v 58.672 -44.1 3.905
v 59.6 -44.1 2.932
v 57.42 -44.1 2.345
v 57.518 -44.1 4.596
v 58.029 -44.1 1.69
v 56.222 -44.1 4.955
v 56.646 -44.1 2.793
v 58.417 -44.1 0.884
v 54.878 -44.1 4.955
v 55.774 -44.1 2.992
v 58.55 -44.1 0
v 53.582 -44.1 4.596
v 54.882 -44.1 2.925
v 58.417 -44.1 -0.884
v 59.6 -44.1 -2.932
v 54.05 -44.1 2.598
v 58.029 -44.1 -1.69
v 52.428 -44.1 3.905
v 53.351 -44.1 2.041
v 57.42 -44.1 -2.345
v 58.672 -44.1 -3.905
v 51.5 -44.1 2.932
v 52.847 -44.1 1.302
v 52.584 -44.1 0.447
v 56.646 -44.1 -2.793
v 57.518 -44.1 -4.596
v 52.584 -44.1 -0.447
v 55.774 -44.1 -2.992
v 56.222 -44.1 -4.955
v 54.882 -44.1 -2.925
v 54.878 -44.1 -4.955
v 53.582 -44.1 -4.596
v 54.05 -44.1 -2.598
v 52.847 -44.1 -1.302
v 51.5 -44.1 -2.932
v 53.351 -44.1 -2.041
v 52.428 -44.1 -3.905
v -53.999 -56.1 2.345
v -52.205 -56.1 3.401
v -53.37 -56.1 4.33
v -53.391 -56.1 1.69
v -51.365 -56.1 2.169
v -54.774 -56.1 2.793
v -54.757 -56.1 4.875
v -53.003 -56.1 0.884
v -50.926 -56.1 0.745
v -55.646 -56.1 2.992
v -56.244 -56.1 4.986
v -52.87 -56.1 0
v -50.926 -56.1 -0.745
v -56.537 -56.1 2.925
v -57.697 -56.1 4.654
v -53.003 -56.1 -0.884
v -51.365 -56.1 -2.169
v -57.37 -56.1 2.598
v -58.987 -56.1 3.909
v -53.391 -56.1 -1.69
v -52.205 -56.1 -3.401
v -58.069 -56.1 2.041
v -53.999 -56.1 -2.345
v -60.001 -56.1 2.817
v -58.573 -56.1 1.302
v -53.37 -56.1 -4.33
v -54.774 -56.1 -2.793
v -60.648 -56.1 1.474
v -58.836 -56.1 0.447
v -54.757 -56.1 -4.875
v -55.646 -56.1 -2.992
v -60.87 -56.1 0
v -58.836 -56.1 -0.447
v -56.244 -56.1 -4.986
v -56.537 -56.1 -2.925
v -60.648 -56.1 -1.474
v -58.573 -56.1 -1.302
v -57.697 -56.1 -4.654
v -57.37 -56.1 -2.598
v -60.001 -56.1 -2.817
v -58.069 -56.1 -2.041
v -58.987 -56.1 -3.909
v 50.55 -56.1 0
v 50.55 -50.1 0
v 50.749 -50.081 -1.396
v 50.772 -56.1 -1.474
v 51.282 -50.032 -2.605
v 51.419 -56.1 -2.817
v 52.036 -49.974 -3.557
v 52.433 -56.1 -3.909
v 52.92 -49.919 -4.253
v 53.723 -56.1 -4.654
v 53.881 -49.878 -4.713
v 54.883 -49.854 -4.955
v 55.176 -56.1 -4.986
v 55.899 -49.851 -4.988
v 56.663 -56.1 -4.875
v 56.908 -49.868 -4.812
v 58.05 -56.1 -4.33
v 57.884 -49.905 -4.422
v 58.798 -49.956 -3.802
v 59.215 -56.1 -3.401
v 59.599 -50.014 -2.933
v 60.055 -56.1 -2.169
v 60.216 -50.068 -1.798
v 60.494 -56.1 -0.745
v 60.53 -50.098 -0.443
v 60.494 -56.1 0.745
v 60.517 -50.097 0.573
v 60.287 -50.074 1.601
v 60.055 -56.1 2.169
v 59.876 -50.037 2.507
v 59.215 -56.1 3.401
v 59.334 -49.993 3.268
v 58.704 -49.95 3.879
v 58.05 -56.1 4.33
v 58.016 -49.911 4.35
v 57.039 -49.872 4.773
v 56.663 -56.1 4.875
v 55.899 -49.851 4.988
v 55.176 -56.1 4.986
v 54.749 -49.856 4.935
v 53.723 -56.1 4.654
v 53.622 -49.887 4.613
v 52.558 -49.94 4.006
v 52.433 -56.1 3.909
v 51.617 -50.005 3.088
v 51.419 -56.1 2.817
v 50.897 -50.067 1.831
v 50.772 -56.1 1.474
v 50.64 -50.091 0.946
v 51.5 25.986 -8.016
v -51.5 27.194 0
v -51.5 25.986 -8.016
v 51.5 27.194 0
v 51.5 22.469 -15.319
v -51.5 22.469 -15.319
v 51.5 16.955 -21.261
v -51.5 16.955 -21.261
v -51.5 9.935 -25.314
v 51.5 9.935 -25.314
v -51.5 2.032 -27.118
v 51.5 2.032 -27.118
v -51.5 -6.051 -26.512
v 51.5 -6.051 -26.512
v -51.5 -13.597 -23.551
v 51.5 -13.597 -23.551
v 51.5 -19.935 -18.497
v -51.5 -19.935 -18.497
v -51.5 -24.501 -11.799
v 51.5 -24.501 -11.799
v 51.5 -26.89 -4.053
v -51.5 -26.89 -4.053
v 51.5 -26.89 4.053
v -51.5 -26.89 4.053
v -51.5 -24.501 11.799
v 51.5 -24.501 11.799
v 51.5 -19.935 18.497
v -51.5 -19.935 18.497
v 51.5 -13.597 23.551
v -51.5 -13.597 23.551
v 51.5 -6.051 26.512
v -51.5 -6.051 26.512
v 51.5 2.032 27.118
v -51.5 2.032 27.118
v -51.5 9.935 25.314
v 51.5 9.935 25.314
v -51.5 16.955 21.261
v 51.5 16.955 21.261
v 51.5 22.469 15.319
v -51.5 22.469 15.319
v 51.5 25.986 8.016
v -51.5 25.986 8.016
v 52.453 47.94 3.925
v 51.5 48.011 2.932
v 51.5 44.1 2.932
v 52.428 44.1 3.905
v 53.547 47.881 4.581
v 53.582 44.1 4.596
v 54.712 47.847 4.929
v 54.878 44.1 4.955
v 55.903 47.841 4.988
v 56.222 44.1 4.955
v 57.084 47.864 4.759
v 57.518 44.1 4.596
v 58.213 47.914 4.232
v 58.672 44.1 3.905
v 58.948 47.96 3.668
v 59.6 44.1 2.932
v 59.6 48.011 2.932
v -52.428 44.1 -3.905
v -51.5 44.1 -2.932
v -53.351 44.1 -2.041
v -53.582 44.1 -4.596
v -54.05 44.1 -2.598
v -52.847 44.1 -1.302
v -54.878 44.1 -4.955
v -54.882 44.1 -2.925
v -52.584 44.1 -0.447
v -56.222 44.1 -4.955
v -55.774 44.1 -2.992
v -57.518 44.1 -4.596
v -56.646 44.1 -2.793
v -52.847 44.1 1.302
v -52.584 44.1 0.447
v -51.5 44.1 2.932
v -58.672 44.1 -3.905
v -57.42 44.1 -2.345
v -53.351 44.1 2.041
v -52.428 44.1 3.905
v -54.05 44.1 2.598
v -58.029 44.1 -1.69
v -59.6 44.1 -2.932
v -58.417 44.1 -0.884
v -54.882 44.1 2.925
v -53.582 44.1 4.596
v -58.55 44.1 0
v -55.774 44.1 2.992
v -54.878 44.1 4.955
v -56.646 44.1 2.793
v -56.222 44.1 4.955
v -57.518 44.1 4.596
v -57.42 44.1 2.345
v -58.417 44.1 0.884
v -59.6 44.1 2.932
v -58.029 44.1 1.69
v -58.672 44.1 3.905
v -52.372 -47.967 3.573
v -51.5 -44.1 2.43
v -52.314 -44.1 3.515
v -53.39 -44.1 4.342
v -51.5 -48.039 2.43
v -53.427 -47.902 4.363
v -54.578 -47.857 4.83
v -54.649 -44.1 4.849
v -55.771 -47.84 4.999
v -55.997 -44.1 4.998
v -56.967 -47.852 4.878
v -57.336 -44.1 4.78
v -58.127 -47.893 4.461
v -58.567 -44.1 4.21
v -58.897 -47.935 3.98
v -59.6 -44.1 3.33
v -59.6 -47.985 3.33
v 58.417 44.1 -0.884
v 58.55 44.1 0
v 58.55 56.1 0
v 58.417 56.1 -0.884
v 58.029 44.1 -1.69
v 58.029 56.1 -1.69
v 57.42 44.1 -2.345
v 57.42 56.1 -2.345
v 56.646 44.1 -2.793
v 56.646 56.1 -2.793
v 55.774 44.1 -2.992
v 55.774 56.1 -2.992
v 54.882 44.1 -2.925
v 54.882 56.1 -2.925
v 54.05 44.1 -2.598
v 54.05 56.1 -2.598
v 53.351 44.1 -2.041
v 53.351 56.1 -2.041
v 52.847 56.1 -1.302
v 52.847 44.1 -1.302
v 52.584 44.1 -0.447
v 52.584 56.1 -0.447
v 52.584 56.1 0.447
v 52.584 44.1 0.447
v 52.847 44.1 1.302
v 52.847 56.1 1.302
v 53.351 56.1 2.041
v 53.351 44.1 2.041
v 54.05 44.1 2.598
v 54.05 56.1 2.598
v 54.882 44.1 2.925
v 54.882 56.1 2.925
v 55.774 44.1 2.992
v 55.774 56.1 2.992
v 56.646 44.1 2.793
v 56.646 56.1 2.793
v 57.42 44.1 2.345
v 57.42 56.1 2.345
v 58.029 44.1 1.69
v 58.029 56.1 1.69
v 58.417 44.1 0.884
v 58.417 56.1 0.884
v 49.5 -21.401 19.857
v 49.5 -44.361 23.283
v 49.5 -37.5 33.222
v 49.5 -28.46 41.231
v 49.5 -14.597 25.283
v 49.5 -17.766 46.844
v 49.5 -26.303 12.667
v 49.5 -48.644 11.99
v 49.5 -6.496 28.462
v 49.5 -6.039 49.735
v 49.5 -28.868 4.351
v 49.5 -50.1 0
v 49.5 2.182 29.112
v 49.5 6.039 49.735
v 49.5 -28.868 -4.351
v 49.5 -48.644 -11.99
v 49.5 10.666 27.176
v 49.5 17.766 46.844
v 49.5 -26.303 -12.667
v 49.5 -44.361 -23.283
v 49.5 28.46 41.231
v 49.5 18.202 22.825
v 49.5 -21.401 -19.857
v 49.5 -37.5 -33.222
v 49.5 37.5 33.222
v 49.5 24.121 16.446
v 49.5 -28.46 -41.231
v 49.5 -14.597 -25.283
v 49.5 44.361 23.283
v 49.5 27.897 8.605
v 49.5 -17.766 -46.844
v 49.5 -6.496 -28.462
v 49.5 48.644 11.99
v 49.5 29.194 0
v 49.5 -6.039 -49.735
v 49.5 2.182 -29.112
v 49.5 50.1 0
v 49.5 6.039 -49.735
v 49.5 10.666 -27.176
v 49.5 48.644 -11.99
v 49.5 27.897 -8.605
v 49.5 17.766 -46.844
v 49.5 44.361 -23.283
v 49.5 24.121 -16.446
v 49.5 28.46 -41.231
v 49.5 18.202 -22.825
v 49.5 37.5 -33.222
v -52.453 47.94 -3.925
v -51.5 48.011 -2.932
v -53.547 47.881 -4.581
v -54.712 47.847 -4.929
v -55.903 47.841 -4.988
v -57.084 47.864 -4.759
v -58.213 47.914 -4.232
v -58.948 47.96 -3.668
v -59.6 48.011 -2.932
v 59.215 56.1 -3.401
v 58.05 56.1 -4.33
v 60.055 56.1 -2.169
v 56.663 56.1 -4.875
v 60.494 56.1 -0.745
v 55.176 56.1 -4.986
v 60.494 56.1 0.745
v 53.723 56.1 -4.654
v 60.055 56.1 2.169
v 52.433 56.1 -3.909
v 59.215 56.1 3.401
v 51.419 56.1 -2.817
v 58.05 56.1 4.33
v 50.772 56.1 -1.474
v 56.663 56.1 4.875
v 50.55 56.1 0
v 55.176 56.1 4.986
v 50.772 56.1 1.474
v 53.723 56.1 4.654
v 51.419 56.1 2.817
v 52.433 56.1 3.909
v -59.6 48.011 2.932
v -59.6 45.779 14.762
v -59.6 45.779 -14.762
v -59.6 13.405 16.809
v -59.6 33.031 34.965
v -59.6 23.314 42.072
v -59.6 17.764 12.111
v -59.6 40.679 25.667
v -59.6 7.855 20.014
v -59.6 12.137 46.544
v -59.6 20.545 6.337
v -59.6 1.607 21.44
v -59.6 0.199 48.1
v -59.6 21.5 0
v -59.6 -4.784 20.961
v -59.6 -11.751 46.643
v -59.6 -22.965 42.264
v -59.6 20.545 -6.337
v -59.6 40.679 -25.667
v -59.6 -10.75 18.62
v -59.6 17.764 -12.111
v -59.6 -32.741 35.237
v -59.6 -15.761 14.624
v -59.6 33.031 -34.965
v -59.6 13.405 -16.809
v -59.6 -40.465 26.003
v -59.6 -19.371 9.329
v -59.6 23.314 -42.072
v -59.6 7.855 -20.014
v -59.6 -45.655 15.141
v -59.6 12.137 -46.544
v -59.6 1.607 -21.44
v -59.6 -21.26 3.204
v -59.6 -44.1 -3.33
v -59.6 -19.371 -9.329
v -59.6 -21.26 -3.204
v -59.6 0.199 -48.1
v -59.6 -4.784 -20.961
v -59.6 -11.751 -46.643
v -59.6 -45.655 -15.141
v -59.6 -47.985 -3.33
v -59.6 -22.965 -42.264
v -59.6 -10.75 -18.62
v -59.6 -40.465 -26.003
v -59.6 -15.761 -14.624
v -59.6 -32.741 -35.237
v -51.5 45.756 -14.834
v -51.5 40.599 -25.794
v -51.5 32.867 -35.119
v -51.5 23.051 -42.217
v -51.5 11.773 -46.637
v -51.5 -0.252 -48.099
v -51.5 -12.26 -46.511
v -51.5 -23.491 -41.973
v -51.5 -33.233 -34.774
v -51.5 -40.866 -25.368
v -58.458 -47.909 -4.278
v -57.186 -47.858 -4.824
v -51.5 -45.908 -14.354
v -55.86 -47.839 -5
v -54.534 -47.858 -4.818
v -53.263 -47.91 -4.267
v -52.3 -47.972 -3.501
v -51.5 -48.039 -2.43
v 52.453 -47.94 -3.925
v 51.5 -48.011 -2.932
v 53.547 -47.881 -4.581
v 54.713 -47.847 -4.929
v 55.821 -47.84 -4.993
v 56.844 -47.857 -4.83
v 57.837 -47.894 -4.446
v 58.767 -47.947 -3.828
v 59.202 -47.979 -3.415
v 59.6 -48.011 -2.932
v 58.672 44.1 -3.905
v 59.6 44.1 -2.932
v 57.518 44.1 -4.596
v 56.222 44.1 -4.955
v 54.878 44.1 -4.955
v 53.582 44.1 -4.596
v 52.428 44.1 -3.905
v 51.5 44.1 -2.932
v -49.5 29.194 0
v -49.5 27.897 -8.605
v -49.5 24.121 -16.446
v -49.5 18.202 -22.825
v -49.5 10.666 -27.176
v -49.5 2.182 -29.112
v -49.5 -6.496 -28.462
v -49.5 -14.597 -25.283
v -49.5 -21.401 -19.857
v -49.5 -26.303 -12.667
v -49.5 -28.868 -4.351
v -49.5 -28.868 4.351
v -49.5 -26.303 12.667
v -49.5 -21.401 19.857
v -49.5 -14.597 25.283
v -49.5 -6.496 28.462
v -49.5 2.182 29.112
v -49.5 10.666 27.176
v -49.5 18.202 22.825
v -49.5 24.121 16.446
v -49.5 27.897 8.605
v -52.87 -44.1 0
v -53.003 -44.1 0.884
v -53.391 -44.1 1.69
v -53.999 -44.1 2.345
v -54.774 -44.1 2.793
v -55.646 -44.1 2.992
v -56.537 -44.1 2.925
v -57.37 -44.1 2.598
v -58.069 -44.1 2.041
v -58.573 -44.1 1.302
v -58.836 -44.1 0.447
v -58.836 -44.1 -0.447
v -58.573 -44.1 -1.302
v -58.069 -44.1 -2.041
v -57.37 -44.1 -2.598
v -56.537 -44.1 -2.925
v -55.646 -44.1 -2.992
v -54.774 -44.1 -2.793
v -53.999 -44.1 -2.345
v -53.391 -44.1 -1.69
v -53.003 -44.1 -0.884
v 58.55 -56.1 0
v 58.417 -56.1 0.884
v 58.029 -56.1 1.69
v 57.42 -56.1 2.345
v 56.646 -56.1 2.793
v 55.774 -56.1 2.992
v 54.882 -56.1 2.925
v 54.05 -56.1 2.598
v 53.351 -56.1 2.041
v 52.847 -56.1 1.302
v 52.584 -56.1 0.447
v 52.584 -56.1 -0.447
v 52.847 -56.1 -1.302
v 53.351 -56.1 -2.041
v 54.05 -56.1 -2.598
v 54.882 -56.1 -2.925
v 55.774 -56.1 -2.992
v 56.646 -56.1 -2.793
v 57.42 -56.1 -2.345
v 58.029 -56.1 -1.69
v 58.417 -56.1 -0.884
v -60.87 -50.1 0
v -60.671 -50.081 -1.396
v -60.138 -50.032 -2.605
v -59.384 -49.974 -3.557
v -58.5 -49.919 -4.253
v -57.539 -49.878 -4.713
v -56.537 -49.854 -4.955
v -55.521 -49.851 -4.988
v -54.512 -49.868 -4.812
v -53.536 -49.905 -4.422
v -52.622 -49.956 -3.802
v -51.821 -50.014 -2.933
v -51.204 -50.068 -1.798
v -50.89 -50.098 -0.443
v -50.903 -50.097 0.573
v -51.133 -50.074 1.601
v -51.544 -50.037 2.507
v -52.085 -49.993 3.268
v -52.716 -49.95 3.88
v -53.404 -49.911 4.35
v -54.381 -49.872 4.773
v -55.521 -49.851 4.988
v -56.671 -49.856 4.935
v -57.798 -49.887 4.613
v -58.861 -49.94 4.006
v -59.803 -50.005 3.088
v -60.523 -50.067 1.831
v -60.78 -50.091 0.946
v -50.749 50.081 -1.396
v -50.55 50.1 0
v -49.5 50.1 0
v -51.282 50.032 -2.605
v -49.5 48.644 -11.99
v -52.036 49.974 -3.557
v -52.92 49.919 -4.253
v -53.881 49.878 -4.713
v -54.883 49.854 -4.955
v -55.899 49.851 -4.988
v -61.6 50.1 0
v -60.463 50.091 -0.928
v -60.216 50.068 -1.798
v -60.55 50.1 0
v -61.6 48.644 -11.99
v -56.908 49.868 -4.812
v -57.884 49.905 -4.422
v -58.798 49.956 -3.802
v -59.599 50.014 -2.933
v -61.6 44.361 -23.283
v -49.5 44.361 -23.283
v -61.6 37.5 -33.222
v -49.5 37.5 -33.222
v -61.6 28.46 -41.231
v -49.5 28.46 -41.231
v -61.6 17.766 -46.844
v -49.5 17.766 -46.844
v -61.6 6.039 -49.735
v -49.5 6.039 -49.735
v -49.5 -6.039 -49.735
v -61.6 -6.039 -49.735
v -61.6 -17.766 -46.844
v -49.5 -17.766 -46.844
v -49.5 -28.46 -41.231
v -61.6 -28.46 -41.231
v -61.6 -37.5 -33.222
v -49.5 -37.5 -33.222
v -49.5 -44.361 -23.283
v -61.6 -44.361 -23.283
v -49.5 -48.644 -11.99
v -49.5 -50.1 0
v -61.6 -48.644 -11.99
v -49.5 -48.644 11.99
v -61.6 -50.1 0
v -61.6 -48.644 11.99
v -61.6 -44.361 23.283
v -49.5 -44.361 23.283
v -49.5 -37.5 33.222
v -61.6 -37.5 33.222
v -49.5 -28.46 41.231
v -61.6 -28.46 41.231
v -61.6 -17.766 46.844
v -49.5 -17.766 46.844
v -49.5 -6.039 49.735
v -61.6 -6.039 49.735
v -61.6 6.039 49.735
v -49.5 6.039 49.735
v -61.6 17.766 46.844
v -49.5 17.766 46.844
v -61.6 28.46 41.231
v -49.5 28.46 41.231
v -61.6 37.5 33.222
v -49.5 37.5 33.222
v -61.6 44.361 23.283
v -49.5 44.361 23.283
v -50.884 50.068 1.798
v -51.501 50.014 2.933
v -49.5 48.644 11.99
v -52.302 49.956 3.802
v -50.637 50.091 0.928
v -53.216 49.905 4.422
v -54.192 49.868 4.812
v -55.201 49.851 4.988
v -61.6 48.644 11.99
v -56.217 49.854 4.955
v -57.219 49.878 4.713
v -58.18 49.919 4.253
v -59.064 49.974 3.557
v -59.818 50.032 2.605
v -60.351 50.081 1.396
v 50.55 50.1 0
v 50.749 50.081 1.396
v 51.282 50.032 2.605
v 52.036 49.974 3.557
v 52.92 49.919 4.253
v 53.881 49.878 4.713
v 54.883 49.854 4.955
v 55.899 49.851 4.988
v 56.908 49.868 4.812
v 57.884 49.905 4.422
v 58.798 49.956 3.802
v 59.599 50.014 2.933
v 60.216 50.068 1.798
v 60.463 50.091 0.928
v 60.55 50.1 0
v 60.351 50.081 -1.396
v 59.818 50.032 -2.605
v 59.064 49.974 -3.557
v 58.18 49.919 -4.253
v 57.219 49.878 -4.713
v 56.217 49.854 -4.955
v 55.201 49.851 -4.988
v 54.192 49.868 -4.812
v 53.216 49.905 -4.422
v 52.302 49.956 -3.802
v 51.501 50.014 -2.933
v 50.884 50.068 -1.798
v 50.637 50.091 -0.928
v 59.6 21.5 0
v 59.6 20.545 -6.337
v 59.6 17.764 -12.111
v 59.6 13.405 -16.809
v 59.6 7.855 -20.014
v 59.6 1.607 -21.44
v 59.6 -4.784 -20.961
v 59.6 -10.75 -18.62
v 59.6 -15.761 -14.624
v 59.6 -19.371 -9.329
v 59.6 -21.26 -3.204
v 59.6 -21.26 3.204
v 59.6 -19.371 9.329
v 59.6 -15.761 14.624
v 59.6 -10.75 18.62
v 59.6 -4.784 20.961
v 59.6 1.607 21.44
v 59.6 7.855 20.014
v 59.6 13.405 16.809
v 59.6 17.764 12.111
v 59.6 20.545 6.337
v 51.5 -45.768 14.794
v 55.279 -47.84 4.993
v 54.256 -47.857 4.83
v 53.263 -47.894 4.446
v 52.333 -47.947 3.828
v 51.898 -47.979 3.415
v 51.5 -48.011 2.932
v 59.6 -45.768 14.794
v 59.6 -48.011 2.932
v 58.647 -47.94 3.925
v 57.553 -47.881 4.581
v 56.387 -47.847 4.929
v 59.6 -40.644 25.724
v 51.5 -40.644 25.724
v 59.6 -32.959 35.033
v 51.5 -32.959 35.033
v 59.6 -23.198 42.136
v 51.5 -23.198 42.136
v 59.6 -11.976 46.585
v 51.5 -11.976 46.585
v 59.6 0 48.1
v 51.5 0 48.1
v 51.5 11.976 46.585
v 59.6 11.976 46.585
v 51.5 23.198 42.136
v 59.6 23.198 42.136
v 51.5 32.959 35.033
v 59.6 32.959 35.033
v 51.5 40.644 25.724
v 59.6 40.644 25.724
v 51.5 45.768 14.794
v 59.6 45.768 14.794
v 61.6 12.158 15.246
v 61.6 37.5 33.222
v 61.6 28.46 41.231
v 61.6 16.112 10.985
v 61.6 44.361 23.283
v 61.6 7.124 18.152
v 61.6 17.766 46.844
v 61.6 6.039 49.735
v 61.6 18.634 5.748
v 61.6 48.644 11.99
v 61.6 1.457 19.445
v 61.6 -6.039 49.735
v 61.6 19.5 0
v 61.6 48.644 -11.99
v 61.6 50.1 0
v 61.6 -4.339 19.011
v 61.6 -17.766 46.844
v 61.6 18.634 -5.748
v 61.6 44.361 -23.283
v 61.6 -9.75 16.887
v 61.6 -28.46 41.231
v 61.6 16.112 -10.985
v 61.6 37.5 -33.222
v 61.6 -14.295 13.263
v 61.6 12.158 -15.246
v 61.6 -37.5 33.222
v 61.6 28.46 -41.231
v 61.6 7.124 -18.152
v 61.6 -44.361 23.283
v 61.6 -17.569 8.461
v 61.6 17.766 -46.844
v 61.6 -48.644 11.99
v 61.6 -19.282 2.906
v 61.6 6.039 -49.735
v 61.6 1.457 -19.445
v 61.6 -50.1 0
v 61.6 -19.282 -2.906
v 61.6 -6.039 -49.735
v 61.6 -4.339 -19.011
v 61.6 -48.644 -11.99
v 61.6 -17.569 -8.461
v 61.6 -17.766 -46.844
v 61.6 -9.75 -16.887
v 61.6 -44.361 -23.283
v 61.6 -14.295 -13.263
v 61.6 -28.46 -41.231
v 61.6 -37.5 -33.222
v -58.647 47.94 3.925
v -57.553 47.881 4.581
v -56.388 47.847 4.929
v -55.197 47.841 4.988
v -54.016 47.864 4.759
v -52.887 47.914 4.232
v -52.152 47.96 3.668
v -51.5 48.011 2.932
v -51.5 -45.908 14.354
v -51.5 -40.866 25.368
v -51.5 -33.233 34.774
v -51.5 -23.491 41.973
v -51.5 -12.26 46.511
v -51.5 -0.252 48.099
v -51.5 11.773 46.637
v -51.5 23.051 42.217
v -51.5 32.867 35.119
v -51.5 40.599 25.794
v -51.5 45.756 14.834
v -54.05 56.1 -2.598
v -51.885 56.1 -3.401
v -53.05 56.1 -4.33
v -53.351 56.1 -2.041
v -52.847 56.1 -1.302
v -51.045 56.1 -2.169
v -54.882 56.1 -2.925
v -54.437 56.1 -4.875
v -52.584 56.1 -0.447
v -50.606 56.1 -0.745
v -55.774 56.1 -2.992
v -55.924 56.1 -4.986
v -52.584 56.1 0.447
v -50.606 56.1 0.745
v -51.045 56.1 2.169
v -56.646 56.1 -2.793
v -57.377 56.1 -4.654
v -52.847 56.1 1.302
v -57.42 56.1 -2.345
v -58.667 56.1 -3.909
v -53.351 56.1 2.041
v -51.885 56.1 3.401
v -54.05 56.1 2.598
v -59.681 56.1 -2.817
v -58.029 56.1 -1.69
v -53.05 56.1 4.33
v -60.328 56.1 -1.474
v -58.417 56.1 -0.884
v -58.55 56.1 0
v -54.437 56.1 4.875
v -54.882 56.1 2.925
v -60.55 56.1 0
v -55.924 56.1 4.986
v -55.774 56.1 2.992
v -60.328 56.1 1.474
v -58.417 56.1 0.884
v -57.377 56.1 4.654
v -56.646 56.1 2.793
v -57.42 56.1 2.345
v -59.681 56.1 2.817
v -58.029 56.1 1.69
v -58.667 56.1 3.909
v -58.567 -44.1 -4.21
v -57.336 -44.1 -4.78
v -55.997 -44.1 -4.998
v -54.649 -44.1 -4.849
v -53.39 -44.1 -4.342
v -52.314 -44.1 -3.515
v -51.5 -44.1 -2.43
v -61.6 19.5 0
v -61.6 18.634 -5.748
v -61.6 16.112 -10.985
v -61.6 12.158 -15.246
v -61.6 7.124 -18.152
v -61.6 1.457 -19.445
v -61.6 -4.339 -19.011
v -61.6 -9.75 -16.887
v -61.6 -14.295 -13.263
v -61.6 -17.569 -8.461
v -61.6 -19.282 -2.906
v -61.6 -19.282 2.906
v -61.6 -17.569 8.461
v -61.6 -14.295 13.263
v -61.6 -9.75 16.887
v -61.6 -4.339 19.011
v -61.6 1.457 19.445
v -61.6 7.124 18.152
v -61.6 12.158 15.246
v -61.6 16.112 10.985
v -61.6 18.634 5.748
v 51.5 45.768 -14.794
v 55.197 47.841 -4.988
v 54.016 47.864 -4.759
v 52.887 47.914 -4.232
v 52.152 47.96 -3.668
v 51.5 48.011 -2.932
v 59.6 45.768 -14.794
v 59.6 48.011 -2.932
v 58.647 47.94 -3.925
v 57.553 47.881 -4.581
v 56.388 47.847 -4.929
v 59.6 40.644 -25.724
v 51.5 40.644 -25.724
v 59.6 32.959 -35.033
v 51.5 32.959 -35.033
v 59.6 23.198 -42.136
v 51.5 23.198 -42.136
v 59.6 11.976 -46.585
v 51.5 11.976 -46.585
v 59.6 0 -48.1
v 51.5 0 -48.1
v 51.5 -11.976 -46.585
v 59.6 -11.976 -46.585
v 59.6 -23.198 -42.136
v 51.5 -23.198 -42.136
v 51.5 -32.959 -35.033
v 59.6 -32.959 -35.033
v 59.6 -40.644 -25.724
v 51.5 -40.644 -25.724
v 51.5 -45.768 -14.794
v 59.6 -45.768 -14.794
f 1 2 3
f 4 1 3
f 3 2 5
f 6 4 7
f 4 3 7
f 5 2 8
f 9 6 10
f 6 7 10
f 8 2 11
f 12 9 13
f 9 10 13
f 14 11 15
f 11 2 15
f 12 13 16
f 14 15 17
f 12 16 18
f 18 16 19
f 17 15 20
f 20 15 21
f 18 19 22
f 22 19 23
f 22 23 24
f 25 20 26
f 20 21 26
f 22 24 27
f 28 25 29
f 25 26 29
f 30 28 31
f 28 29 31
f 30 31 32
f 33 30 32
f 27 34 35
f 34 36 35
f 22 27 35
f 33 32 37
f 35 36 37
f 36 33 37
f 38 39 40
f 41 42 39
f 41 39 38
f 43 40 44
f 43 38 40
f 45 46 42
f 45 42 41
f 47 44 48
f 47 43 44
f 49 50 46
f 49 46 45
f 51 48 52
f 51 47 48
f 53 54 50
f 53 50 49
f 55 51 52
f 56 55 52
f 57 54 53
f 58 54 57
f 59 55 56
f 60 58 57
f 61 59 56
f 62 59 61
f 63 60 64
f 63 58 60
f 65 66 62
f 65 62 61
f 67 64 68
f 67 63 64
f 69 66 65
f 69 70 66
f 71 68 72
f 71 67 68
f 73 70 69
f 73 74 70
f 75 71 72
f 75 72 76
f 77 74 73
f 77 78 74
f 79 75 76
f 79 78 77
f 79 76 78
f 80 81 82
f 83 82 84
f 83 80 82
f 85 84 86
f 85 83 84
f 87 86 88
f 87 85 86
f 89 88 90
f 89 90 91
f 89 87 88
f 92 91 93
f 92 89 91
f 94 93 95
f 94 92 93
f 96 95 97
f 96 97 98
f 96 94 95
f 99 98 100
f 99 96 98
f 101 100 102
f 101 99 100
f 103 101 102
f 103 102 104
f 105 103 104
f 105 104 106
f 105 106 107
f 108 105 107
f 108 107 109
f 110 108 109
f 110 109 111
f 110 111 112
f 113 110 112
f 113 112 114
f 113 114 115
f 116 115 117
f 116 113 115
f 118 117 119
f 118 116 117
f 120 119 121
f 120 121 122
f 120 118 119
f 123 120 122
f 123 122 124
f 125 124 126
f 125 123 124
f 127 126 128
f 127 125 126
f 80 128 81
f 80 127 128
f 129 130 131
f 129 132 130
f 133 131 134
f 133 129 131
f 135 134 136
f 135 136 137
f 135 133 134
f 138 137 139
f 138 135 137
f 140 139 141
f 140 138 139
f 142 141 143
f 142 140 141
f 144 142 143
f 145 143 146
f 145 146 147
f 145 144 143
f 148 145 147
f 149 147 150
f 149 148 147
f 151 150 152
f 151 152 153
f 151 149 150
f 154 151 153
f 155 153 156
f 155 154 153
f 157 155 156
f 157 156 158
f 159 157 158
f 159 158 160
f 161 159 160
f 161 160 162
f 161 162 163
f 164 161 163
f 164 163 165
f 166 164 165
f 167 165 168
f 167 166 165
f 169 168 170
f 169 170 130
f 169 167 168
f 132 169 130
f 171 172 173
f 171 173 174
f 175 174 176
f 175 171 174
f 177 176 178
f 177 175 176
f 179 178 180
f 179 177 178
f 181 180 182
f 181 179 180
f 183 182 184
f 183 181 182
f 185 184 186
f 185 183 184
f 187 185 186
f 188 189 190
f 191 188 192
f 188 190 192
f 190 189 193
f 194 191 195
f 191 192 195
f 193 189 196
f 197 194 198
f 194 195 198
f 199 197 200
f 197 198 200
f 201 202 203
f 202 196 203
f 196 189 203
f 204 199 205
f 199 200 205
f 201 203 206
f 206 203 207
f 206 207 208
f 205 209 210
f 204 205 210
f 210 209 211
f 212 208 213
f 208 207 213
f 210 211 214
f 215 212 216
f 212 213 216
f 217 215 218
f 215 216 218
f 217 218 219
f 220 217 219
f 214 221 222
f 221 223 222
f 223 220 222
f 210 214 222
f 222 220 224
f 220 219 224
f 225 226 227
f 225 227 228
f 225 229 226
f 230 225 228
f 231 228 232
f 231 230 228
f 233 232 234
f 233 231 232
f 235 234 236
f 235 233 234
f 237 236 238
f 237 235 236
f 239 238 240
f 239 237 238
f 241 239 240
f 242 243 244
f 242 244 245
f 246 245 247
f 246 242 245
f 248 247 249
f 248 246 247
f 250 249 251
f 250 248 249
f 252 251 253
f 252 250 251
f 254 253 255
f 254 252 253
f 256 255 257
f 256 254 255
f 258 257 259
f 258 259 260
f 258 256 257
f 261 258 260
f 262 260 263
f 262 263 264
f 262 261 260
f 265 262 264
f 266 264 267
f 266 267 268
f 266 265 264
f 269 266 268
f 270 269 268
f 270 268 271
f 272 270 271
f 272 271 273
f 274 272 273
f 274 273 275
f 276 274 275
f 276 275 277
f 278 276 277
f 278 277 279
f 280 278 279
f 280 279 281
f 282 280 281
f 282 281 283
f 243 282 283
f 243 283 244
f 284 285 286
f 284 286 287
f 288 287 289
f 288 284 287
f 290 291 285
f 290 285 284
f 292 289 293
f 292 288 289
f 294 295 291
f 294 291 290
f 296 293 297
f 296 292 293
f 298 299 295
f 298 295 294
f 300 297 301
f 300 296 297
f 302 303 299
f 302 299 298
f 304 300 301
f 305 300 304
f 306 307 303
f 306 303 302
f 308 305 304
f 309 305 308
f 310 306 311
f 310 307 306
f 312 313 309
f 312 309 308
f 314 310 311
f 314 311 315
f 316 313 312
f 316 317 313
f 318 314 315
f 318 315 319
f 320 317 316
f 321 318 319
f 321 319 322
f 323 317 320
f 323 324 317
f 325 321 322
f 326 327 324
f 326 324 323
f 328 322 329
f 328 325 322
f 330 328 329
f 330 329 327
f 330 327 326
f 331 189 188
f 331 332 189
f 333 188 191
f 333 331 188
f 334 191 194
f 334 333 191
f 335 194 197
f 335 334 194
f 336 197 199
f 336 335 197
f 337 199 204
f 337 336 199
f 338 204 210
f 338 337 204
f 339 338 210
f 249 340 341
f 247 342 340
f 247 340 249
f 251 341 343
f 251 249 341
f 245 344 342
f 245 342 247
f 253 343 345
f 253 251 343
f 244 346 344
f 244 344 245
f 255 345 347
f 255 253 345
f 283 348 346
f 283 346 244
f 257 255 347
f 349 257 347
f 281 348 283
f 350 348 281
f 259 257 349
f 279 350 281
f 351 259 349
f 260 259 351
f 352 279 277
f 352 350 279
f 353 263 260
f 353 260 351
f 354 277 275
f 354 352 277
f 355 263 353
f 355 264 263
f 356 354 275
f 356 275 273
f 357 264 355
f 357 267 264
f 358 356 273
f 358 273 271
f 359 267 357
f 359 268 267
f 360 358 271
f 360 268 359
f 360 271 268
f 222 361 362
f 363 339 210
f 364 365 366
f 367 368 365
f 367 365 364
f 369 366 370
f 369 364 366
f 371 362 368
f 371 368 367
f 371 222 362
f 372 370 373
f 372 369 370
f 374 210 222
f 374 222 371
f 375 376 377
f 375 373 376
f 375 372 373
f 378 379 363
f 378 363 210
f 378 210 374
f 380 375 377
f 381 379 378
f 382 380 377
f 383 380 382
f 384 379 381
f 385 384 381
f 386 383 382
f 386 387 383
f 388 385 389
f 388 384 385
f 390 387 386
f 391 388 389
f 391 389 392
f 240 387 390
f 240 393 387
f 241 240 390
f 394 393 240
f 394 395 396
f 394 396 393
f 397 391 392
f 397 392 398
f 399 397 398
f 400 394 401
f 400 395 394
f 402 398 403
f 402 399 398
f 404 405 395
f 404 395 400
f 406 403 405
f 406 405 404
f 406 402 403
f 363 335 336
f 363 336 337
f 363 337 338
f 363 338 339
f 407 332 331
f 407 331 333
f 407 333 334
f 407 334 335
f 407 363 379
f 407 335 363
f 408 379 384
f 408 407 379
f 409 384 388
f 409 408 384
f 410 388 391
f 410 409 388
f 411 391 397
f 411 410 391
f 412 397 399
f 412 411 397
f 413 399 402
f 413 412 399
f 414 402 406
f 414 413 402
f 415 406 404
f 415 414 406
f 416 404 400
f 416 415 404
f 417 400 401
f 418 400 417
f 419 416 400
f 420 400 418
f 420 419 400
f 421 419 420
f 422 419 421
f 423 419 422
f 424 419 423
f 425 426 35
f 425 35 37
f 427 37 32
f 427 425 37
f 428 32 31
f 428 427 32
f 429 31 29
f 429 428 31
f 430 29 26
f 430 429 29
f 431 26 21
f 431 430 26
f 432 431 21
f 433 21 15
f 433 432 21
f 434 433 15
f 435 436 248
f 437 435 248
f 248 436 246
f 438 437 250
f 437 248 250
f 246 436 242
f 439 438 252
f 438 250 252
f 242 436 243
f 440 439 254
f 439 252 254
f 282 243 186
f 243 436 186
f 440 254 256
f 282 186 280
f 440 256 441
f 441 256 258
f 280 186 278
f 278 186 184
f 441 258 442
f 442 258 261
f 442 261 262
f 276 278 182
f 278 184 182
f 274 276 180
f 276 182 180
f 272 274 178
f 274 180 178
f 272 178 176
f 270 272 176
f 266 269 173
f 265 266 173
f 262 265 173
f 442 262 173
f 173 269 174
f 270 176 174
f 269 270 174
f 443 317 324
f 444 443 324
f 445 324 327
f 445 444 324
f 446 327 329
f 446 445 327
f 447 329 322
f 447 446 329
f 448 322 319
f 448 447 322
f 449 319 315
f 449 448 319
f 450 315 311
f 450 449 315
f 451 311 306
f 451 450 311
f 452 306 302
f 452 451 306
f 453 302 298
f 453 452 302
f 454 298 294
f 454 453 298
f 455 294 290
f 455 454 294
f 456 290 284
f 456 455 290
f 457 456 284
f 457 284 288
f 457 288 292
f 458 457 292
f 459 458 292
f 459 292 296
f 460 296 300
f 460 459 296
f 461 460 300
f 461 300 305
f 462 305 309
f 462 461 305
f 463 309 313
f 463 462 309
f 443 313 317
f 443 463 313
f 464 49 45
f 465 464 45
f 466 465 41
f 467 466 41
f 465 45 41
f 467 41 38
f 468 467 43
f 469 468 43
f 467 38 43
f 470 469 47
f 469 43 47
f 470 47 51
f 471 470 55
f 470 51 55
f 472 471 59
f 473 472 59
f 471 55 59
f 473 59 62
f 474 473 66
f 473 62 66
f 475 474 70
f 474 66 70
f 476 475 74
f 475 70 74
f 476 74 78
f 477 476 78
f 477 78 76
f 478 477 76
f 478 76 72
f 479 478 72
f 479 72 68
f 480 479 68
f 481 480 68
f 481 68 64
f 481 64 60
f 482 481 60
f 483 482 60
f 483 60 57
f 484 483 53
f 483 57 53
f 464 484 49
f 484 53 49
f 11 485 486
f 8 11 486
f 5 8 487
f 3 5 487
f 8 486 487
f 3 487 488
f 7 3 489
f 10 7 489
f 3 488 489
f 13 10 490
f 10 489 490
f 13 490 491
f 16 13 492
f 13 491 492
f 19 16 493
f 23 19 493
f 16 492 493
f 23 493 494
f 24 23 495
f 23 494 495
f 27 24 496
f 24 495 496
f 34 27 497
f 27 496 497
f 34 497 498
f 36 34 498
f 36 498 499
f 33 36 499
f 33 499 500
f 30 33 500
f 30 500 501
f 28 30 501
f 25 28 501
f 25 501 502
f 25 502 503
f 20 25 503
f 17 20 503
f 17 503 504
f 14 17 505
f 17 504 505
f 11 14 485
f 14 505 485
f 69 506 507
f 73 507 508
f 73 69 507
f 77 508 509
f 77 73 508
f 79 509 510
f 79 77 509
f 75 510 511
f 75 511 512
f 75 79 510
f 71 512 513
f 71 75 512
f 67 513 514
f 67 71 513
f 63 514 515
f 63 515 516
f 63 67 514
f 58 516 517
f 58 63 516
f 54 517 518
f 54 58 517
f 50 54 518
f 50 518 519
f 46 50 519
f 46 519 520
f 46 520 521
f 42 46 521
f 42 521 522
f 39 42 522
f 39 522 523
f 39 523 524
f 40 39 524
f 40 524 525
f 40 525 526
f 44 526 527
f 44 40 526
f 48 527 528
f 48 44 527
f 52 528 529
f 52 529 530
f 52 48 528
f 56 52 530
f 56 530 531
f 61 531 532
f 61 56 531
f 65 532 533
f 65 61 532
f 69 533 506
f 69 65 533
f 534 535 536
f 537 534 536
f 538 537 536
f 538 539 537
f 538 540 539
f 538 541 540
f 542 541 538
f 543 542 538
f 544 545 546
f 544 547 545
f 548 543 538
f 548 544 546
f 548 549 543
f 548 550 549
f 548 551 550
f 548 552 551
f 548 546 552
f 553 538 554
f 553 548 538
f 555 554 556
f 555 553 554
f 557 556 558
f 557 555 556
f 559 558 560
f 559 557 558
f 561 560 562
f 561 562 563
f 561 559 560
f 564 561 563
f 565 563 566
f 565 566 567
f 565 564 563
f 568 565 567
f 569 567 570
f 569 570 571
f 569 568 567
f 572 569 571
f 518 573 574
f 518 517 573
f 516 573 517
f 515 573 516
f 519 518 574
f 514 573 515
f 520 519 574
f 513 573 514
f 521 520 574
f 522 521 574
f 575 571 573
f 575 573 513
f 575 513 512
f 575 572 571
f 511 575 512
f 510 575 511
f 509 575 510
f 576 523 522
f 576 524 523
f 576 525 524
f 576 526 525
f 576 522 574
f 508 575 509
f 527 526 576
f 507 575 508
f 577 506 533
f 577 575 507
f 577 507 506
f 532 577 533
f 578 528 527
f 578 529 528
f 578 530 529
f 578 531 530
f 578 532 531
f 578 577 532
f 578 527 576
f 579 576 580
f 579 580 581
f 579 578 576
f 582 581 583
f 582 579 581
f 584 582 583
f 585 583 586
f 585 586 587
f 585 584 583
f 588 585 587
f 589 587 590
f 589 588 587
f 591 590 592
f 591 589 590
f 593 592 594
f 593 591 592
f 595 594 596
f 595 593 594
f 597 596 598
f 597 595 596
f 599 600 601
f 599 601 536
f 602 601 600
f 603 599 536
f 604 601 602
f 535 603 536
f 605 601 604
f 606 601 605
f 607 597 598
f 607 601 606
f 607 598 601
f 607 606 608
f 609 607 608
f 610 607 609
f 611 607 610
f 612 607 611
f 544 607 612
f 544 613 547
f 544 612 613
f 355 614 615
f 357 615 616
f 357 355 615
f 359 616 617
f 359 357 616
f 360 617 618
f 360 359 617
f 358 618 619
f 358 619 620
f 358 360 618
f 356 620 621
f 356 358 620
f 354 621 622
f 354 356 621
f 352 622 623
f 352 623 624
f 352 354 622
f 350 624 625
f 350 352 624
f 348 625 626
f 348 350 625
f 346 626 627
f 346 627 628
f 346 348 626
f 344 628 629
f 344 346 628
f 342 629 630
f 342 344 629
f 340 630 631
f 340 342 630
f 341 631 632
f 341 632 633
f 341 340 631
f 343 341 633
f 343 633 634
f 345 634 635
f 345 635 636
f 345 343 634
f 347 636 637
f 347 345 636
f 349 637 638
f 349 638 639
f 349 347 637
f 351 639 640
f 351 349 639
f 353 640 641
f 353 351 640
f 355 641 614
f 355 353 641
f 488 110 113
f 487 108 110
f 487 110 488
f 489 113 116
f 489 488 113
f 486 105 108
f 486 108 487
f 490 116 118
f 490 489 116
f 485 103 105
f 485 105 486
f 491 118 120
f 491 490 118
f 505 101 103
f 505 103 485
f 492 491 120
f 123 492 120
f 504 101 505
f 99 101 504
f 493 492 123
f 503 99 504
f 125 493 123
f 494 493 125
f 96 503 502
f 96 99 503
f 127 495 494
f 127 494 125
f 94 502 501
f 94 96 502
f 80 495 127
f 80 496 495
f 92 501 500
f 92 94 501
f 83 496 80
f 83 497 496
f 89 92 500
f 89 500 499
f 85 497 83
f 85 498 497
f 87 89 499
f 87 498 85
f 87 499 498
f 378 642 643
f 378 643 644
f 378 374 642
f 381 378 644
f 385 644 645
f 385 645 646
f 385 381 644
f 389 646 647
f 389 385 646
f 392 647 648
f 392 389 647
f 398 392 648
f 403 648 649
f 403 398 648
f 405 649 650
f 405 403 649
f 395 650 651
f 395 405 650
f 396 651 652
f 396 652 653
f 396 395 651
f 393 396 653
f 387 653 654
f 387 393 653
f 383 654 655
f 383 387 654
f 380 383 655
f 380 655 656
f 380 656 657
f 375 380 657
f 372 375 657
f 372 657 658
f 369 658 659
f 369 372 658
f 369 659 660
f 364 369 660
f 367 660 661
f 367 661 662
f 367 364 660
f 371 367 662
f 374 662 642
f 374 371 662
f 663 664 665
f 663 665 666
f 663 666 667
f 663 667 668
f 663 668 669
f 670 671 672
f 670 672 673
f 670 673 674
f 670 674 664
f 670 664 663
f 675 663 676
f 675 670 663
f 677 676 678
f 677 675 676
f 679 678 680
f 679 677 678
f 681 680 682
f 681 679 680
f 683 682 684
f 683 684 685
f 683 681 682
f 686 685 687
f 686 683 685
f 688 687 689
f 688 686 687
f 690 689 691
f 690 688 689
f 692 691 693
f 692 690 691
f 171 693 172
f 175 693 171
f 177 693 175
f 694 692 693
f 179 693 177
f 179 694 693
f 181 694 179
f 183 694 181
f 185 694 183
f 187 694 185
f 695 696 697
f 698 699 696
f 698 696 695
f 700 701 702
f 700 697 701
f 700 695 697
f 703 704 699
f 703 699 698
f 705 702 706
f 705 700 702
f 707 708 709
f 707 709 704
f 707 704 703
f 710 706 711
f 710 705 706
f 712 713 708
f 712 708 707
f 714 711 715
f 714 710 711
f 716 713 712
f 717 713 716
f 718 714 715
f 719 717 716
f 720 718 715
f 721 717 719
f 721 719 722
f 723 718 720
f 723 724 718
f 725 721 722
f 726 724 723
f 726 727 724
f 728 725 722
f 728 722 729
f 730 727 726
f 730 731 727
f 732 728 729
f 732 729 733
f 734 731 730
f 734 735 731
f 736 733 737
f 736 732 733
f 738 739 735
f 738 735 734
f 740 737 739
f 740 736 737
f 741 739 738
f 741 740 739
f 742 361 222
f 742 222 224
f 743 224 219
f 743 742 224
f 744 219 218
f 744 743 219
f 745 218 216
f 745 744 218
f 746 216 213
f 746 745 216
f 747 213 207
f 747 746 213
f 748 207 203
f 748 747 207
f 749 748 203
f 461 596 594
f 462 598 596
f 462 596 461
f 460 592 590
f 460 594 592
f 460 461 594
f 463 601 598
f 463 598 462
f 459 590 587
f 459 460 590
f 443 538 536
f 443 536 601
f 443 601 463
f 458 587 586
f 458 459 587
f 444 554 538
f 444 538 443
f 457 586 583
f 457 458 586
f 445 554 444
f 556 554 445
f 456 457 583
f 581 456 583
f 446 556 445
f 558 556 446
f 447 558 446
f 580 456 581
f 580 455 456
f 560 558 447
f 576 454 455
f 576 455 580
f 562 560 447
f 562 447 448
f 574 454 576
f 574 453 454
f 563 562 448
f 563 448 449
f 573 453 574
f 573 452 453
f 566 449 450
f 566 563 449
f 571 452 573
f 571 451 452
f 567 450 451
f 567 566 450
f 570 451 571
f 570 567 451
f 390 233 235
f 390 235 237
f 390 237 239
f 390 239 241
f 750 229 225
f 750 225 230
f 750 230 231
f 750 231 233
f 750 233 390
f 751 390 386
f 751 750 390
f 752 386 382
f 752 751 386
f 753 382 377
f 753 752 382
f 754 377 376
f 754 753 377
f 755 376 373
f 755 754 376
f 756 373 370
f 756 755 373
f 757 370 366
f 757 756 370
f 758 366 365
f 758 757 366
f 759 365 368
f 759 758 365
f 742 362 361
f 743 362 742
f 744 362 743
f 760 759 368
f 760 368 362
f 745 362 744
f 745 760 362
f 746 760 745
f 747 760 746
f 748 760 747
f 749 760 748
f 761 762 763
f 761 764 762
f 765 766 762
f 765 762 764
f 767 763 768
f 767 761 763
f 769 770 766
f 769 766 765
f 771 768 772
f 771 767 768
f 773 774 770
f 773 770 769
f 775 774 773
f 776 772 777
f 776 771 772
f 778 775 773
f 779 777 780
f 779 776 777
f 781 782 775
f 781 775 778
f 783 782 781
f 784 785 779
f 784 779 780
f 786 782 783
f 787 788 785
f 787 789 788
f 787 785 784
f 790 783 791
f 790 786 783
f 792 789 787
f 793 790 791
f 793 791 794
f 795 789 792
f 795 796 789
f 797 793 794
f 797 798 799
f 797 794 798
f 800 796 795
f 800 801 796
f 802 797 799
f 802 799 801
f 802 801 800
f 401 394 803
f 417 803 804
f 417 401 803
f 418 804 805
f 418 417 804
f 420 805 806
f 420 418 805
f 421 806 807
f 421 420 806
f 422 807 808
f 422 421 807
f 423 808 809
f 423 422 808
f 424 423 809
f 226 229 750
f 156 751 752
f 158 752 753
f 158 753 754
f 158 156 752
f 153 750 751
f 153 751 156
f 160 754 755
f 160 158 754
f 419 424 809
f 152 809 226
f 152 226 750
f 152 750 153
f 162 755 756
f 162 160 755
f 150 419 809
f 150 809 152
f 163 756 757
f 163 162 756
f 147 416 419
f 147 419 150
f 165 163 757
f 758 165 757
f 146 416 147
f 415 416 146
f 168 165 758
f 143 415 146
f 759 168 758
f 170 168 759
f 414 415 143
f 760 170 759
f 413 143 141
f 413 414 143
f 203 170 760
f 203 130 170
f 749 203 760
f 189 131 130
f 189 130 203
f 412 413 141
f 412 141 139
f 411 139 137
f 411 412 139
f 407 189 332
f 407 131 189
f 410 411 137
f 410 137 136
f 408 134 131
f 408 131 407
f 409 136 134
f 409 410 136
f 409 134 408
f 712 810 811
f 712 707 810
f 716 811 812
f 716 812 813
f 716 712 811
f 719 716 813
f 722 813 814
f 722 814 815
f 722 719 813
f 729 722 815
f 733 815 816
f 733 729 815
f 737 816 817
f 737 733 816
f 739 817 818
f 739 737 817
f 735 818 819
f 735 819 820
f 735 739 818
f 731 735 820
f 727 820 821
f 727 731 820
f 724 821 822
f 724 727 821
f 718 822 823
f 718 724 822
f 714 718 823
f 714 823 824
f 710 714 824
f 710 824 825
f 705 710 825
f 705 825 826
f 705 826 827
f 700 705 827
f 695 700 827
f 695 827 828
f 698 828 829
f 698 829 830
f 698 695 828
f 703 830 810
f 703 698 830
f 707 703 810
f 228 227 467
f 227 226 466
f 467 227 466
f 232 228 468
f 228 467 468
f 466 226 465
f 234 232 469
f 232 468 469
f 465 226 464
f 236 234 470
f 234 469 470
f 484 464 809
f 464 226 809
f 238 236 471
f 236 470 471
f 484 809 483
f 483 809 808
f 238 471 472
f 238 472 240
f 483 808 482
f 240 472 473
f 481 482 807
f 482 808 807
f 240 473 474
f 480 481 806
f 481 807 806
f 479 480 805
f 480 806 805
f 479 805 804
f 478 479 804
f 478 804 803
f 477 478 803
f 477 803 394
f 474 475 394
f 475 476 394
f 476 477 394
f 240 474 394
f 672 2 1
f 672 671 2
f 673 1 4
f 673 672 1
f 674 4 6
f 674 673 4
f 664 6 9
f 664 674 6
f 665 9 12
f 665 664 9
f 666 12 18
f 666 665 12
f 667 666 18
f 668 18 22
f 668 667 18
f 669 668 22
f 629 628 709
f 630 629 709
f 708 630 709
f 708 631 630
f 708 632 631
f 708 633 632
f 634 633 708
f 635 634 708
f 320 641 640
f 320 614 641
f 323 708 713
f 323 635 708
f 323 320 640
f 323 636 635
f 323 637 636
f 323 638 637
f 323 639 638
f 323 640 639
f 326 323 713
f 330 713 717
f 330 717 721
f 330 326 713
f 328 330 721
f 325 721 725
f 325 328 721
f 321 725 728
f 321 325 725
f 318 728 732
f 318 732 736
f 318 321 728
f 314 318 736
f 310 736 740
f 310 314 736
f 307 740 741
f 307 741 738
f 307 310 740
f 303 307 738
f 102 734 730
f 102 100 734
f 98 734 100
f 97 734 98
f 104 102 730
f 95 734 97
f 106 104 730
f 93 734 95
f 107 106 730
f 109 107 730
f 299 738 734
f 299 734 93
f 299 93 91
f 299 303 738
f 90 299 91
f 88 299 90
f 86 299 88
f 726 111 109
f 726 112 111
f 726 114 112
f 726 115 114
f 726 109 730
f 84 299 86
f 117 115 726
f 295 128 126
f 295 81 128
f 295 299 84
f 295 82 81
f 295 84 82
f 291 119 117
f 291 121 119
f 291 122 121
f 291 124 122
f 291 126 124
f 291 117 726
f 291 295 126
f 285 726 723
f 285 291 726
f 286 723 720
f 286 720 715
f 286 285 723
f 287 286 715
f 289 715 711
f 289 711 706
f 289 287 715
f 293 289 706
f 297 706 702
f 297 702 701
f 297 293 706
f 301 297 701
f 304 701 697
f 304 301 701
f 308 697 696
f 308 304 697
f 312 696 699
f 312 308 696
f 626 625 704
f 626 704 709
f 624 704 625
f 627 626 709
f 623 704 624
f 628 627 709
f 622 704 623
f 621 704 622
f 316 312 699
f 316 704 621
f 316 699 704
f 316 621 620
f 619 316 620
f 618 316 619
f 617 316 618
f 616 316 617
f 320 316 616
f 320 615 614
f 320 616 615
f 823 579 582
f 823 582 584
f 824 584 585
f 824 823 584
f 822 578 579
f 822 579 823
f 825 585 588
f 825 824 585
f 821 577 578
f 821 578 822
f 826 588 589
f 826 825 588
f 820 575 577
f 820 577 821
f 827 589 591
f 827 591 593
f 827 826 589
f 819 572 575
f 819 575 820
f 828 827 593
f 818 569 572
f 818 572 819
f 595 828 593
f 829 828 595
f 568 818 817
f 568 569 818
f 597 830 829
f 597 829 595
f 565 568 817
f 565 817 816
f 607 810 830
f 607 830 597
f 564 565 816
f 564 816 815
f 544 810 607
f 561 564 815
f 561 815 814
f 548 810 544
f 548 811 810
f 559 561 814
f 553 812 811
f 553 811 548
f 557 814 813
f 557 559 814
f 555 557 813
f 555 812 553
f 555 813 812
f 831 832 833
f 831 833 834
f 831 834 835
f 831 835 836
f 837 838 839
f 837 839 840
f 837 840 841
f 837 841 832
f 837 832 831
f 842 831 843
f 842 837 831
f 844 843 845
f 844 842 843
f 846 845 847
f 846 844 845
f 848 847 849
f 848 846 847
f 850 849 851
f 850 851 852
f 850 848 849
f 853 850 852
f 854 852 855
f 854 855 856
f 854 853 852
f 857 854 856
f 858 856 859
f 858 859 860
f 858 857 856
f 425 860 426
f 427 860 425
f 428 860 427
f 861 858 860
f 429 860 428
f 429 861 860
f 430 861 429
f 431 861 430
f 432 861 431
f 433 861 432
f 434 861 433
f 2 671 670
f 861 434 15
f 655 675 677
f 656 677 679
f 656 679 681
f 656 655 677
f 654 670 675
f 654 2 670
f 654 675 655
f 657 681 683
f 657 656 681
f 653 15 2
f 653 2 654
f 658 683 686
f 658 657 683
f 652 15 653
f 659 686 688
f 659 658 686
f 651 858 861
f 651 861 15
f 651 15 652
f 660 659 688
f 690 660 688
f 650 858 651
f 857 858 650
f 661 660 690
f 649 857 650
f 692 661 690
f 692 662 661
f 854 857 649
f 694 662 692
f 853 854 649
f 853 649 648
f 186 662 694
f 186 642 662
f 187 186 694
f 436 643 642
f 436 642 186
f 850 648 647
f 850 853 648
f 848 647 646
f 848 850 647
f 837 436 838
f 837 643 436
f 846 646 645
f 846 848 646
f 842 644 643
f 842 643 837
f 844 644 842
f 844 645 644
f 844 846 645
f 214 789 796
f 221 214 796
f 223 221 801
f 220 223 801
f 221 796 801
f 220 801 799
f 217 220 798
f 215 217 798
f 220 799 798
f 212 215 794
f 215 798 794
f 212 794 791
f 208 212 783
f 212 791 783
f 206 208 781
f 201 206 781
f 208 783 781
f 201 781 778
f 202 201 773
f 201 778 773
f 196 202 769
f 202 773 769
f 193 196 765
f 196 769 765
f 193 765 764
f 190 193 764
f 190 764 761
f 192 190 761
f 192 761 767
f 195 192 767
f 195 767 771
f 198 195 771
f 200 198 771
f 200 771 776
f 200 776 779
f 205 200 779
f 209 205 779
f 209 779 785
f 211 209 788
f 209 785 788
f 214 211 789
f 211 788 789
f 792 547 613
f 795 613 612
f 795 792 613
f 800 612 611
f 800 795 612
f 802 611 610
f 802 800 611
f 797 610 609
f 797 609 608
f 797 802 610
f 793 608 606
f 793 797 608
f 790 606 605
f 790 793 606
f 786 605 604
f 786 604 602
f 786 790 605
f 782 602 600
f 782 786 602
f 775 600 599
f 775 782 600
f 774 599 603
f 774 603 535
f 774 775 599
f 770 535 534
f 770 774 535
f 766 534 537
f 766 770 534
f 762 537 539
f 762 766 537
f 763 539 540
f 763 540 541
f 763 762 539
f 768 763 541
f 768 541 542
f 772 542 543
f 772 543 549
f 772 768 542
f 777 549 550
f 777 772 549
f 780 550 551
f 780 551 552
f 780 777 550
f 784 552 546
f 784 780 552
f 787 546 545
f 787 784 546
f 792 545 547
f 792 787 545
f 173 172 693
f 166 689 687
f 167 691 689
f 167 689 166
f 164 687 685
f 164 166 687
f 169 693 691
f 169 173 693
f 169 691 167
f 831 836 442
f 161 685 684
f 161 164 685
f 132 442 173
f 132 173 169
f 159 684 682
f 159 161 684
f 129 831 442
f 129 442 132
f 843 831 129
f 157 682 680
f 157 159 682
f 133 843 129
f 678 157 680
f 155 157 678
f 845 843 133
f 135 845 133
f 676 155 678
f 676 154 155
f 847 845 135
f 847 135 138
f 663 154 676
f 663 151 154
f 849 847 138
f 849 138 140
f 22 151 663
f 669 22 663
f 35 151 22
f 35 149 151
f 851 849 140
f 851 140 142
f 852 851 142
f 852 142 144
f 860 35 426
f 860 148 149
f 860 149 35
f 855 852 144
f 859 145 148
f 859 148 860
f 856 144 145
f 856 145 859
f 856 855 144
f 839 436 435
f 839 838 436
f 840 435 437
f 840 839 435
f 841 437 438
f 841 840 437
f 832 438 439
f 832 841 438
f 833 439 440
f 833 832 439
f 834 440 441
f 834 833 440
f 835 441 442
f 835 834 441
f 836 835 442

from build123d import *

# Parameters (mm, degrees)
CROQUIS3_R              = 5
SALIENTE_EXTRUIR1_DEPTH = 6
CROQUIS4_R              = 3
CORTAR_EXTRUIR1_DEPTH   = 12
CROQUIS5_R              = 5
SALIENTE_EXTRUIR2_DEPTH = 6
CROQUIS8_R              = 5
SALIENTE_EXTRUIR4_DEPTH = 6
CROQUIS9_R              = 3
CORTAR_EXTRUIR4_DEPTH   = 12
CROQUIS10_R             = 5
SALIENTE_EXTRUIR5_DEPTH = 6
CROQUIS11_R             = 3
CORTAR_EXTRUIR5_DEPTH   = 12
CORTAR_EXTRUIR7_START   = -16
CROQUIS14_R             = 3
CORTAR_EXTRUIR7_DEPTH   = 16


with BuildPart() as part:
    # Camisa → Revolución3 (revolve)
    with BuildSketch(Plane.XY):
        Polygon((-61.6, 19.5), (61.6, 19.5), (61.6, 50.1), (49.5, 50.1), (49.5, 29.193885615), (-49.5, 29.193885615), (-49.5, 50.1), (-61.6, 50.1), align=None)
        Polygon((51.5, 48.1), (59.6, 48.1), (59.6, 21.5), (-59.6, 21.5), (-59.6, 48.1), (-51.5, 48.1), (-51.5, 27.193885615), (51.5, 27.193885615), align=None, mode=Mode.SUBTRACT)
    revolve(axis=Axis((125, 0, 0), (-1, 0, 0)))

    # Croquis3 → Saliente-Extruir1 (add, symmetric)
    with BuildSketch(Plane(origin=(0, 50.1, 0), x_dir=(1, 0, 0), z_dir=(0, 1, 0))):
        with Locations(Location((-55.55, 0, 0), (0, 0, 180))):
            Circle(CROQUIS3_R)
    extrude(amount=SALIENTE_EXTRUIR1_DEPTH, both=True)

    # Croquis4 → Cortar-Extruir1 (cut)
    with BuildSketch(Plane(origin=(0, 56.1, 0), x_dir=(1, 0, 0), z_dir=(0, 1, 0))):
        with Locations(Location((-55.55, 0, 0), (0, 0, 180))):
            Circle(CROQUIS4_R)
    extrude(amount=-CORTAR_EXTRUIR1_DEPTH, mode=Mode.SUBTRACT)

    # Croquis5 → Saliente-Extruir2 (add, symmetric)
    with BuildSketch(Plane(origin=(0, 50.1, 0), x_dir=(1, 0, 0), z_dir=(0, 1, 0))):
        with Locations(Location((55.55, 0, 0), (0, 0, 180))):
            Circle(CROQUIS5_R)
    extrude(amount=SALIENTE_EXTRUIR2_DEPTH, both=True)

    # Croquis8 → Saliente-Extruir4 (add, symmetric)
    with BuildSketch(Plane(origin=(0, -50.1, 0), x_dir=(-1, 0, 0), z_dir=(0, -1, 0))):
        with Locations((55.869923699, 0)):
            Circle(CROQUIS8_R)
    extrude(amount=SALIENTE_EXTRUIR4_DEPTH, both=True)

    # Croquis9 → Cortar-Extruir4 (cut)
    with BuildSketch(Plane.XZ.offset(56.1)):
        with Locations((-55.869923699, 0)):
            Circle(CROQUIS9_R)
    extrude(amount=-CORTAR_EXTRUIR4_DEPTH, mode=Mode.SUBTRACT)

    # Croquis10 → Saliente-Extruir5 (add, symmetric)
    with BuildSketch(Plane(origin=(0, -50.1, 0), x_dir=(-1, 0, 0), z_dir=(0, -1, 0))):
        with Locations((-55.55, 0)):
            Circle(CROQUIS10_R)
    extrude(amount=SALIENTE_EXTRUIR5_DEPTH, both=True)

    # Croquis11 → Cortar-Extruir5 (cut)
    with BuildSketch(Plane.XZ.offset(56.1)):
        with Locations((55.55, 0)):
            Circle(CROQUIS11_R)
    extrude(amount=-CORTAR_EXTRUIR5_DEPTH, mode=Mode.SUBTRACT)

    # Croquis14 → Cortar-Extruir7 (cut)
    with BuildSketch(Plane(origin=(0, 56.1, 0), x_dir=(1, 0, 0), z_dir=(0, 1, 0)).offset(CORTAR_EXTRUIR7_START)):
        with Locations((55.55, 0)):
            Circle(CROQUIS14_R)
    extrude(amount=CORTAR_EXTRUIR7_DEPTH, mode=Mode.SUBTRACT)


solid = part.part
